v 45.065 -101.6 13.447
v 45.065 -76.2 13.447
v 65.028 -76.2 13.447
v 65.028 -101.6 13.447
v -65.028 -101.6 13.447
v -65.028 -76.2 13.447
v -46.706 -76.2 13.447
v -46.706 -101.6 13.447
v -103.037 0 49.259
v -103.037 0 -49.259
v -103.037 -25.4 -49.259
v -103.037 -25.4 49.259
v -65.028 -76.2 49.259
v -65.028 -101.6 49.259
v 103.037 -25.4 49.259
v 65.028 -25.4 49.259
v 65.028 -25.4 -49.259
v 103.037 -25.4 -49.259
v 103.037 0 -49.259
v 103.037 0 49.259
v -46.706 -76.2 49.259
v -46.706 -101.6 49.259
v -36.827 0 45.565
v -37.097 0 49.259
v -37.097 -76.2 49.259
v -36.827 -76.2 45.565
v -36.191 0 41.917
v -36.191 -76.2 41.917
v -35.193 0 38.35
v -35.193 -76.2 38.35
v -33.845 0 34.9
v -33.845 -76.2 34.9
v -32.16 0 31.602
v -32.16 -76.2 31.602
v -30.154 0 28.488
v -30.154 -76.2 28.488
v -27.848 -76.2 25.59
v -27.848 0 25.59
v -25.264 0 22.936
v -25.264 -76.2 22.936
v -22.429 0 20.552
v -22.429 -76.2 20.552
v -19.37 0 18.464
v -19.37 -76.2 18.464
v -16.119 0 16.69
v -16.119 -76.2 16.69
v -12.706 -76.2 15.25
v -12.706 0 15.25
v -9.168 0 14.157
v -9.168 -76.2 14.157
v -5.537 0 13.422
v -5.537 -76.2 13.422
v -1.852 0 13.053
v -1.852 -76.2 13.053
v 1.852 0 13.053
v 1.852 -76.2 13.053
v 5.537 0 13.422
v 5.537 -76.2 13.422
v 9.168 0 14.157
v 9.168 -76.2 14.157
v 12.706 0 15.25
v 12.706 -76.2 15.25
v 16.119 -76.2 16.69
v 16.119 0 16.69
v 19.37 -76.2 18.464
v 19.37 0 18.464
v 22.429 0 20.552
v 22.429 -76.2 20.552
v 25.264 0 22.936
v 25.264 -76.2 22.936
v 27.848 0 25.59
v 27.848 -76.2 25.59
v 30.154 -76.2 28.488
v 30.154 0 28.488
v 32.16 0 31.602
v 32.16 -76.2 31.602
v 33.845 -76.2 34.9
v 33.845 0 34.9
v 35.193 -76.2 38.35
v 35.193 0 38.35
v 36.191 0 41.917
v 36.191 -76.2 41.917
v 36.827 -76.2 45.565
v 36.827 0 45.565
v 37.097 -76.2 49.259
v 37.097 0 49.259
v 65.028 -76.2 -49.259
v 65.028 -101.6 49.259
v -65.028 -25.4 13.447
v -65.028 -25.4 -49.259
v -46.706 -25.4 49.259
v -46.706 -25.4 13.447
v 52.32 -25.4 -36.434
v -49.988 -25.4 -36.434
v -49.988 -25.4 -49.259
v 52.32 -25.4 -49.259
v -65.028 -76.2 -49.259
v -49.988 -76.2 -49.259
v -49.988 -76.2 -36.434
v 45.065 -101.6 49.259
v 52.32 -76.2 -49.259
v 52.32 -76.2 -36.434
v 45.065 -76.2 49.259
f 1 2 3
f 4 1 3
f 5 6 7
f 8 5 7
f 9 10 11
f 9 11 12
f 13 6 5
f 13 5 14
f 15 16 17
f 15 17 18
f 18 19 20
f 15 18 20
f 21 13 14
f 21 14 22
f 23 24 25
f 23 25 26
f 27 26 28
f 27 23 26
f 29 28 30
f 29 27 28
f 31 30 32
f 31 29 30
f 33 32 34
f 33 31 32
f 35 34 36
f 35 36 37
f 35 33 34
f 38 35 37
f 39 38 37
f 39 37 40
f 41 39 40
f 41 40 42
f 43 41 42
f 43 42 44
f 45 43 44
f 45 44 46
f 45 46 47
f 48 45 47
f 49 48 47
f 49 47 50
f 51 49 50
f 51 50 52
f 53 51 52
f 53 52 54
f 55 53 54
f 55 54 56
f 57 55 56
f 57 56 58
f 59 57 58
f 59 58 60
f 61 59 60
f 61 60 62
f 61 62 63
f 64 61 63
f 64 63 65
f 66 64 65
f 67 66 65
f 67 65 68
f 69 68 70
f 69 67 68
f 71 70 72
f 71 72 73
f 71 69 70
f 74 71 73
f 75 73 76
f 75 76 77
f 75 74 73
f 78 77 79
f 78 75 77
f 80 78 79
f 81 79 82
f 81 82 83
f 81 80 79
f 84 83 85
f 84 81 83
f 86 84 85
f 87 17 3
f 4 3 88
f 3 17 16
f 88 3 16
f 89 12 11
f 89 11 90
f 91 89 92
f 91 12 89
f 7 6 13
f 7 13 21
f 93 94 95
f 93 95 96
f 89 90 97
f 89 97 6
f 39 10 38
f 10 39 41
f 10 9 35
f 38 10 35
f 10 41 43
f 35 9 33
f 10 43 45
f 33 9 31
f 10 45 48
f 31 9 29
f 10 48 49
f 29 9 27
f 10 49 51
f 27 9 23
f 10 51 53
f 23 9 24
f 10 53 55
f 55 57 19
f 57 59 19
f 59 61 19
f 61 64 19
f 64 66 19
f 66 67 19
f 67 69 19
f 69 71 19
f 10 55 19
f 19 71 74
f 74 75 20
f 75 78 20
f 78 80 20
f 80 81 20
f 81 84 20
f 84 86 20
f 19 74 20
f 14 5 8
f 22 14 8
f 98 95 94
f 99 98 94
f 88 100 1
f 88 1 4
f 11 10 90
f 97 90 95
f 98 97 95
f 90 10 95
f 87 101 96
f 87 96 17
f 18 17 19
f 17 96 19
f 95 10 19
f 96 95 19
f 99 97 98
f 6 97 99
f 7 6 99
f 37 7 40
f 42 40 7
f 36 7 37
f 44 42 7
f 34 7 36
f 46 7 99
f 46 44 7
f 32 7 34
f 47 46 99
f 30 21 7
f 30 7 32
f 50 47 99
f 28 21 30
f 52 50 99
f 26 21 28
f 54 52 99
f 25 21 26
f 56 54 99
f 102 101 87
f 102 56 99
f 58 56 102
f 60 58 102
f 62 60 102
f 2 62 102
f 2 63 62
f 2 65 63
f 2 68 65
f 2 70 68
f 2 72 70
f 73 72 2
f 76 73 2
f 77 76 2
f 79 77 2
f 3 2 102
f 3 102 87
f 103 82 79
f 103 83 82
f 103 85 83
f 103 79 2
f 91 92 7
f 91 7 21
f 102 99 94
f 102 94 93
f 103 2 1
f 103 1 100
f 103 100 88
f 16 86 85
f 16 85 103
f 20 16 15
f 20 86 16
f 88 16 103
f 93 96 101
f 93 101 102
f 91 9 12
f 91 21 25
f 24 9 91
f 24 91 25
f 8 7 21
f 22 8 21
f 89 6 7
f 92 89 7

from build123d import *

# Parameters (mm, degrees)
F0_W      = 206.0731202364
F0_H      = 98.518691957
F1_DEPTH  = 25.4
F2_W      = 130.0561721606
F2_H      = 98.518691957
F3_DEPTH  = 50.8
F4_W      = 102.3078672588
F4_H      = 12.8249134868
F5_DEPTH  = 50.8
F6_R      = 37.1073402664
F7_DEPTH  = 76.2
F8_W      = 18.3221174023
F8_H      = 35.8118899167
F9_DEPTH  = 50.8
F8_W_2    = 19.963033273
F10_DEPTH = 25.4


with BuildPart() as f1:
    # F0 (on Front) → F1 (new body)
    with BuildSketch(Plane.XZ):
        Rectangle(F0_W, F0_H)
    extrude(amount=F1_DEPTH)

    # F2 (on face) → F3 (join)
    with BuildSketch(Plane.XZ.offset(25.4)):
        Rectangle(F2_W, F2_H)
    extrude(amount=F3_DEPTH)

    # F4 (on face) → F5 (cut)
    with BuildSketch(Plane.XZ.offset(76.2)):
        with Locations((1.1659022421, -42.8468892351)):
            Rectangle(F4_W, F4_H)
    extrude(amount=-F5_DEPTH, mode=Mode.SUBTRACT)

    # F6 (on Front) → F7 (cut)
    with BuildSketch(Plane.XZ):
        with Locations((0, 50.1140579581)):
            Circle(F6_R)
    extrude(amount=F7_DEPTH, mode=Mode.SUBTRACT)

    # F8 (on face) → F9 (cut)
    with BuildSketch(Plane.XZ.offset(76.2)):
        with Locations((-55.8670273792, 31.3534010202)):
            Rectangle(F8_W, F8_H)
    extrude(amount=-F9_DEPTH, mode=Mode.SUBTRACT)

    # F8 (on face) → F10 (join)
    with BuildSketch(Plane.XZ.offset(76.2)):
        with Locations((-55.8670273792, 31.3534010202)):
            Rectangle(F8_W, F8_H)
        with Locations((55.0465694438, 31.3534010202)):
            Rectangle(F8_W_2, F8_H)
    extrude(amount=F10_DEPTH)


solid = f1.part
